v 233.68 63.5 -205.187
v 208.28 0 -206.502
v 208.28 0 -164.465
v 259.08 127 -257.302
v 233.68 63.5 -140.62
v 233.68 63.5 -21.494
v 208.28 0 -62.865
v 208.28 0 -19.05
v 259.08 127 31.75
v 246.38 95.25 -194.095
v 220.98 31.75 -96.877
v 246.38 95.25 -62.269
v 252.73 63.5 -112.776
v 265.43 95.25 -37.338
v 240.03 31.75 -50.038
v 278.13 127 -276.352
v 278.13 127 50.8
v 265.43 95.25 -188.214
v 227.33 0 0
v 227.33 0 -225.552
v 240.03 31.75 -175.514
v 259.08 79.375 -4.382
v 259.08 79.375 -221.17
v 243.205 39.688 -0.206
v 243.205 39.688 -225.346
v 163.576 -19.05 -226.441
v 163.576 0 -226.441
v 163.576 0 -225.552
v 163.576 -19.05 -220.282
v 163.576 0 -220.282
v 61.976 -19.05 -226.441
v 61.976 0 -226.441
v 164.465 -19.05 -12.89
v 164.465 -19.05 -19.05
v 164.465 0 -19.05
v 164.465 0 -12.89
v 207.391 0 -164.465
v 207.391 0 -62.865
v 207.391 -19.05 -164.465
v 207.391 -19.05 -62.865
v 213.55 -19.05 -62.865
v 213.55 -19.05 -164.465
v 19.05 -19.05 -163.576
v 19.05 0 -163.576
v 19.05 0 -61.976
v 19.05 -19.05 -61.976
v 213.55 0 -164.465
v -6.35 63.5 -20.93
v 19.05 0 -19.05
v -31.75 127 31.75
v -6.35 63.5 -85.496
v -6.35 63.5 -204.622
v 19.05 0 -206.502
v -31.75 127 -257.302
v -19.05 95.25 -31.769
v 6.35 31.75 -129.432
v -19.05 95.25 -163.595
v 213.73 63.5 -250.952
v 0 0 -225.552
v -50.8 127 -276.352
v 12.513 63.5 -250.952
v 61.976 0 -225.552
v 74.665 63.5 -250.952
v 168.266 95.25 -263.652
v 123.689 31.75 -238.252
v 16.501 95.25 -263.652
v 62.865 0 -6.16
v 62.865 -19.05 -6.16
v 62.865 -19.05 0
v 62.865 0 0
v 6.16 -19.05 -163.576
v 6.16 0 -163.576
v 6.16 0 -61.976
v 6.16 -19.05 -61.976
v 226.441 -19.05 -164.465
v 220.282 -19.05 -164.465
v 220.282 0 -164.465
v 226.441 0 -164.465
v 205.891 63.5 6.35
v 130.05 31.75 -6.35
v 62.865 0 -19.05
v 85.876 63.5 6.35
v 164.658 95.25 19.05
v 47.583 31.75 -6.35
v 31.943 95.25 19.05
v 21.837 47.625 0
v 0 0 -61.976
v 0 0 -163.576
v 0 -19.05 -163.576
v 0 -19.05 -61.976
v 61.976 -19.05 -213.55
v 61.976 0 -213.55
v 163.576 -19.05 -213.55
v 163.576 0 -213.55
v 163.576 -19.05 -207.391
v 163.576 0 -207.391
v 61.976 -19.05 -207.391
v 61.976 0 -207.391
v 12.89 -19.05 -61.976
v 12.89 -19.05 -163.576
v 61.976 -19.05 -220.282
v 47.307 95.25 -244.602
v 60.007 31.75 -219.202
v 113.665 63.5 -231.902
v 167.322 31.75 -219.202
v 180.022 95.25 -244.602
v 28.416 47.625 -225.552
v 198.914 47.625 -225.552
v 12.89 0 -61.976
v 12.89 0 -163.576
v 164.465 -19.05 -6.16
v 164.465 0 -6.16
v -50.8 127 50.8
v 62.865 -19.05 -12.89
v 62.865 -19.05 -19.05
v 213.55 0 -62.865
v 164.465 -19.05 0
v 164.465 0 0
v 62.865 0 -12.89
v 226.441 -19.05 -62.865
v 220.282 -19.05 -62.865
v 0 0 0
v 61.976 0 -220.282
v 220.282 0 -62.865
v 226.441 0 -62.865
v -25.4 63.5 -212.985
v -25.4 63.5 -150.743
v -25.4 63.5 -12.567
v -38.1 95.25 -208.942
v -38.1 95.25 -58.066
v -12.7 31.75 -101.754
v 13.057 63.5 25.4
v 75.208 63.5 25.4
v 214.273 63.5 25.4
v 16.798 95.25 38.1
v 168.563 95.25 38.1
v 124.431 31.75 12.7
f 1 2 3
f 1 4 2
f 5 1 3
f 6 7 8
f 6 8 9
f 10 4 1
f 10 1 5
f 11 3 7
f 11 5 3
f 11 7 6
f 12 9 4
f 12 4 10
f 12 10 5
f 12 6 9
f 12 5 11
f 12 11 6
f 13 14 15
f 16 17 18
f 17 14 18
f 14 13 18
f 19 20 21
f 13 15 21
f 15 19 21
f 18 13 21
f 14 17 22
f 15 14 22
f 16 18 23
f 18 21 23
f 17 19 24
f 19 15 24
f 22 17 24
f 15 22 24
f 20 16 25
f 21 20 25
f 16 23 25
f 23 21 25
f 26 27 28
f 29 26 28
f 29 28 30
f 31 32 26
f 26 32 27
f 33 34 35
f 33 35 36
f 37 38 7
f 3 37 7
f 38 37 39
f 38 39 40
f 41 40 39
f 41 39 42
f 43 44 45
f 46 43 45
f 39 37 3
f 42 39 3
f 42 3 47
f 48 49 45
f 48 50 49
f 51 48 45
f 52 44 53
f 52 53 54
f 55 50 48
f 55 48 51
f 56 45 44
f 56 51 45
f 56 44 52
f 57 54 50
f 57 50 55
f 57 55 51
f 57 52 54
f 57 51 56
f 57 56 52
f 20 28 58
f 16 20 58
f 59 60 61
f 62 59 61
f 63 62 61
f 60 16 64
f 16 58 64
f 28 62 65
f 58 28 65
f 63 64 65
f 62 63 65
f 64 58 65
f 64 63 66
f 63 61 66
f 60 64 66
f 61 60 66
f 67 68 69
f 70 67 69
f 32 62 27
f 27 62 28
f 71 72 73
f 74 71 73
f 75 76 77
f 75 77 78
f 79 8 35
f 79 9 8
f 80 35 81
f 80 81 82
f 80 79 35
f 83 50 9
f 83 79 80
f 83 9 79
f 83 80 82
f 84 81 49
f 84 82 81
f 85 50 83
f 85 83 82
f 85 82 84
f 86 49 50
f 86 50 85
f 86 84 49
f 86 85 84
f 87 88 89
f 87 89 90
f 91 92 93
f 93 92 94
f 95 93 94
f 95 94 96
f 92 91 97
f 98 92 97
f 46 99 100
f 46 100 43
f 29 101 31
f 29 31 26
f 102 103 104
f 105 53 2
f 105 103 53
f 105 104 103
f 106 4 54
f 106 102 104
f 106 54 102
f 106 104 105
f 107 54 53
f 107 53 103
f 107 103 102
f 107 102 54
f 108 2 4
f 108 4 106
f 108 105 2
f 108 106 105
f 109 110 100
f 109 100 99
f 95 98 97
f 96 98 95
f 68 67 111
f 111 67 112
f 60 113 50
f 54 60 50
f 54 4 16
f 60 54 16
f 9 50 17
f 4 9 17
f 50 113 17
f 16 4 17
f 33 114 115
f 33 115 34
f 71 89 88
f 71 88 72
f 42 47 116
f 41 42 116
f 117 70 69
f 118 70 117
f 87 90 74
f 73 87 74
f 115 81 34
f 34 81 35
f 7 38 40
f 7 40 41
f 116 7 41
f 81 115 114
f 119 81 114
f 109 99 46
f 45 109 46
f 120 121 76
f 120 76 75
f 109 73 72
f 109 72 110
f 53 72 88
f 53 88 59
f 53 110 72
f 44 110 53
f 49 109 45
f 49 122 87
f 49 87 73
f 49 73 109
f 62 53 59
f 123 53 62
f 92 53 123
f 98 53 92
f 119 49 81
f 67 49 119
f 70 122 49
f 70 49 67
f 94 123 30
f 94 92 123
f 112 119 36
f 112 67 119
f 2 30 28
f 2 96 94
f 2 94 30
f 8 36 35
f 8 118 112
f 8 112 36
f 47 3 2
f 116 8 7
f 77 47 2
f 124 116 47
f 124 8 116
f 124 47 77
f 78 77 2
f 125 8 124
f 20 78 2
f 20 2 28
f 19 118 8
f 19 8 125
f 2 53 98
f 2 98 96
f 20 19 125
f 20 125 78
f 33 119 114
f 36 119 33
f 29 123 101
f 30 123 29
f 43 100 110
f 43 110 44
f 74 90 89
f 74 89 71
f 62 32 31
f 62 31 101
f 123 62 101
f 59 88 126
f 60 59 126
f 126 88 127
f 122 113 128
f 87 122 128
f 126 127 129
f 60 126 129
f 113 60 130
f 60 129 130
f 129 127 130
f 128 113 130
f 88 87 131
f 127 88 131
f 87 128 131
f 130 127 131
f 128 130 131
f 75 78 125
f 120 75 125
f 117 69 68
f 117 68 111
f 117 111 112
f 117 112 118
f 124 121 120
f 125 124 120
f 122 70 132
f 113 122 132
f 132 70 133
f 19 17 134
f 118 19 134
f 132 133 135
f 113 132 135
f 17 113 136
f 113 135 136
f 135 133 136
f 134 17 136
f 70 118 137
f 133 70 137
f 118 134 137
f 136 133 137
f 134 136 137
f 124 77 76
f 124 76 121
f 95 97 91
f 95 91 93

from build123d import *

# Parameters (mm, degrees)
SKETCH5_W           = 6.1595
SKETCH5_H           = 101.6
SKETCH5_W_2         = 101.6
SKETCH5_H_2         = 6.1595
BOSS_EXTRUDE1_DEPTH = 19.05


with BuildPart() as part:
    # Sketch2 → Loft1 section 0
    with BuildSketch(Plane(origin=(0, 127, 0), x_dir=(1, 0, 0), z_dir=(0, 1, 0))):
        with BuildLine():
            Line((-50.8, -50.8), (278.13, -50.8))
            Line((278.13, -50.8), (278.13, 276.352))
            Line((278.13, 276.352), (-50.8, 276.352))
            Line((-50.8, 276.352), (-50.8, -50.8))
        make_face()
    # Sketch1 → Loft1 section 1
    with BuildSketch(Plane(origin=(0, 0, 0), x_dir=(1, 0, 0), z_dir=(0, 1, 0))):
        with BuildLine():
            Line((0, 0), (227.33, 0))
            Line((227.33, 0), (227.33, 225.552))
            Line((227.33, 225.552), (0, 225.552))
            Line((0, 225.552), (0, 0))
        make_face()
    loft()

    # Sketch4 → Cut-Loft3 section 0
    with BuildSketch(Plane.XZ):
        with BuildLine():
            Line((208.28, -19.05), (19.05, -19.05))
            Line((19.05, -19.05), (19.05, -206.502))
            Line((19.05, -206.502), (208.28, -206.502))
            Line((208.28, -206.502), (208.28, -19.05))
        make_face()
    # Sketch3 → Cut-Loft3 section 1
    with BuildSketch(Plane(origin=(0, 127, 0), x_dir=(1, 0, 0), z_dir=(0, 1, 0))):
        with BuildLine():
            Line((-31.75, 257.302), (-31.75, -31.75))
            Line((-31.75, -31.75), (259.08, -31.75))
            Line((259.08, -31.75), (259.08, 257.302))
            Line((259.08, 257.302), (-31.75, 257.302))
        make_face()
    loft(mode=Mode.SUBTRACT)

    # Sketch5 → Boss-Extrude1 (add)
    with BuildSketch(Plane.XZ):
        with Locations((3.07975, -112.776)):
            Rectangle(SKETCH5_W, SKETCH5_H)
        with Locations((15.97025, -112.776)):
            Rectangle(SKETCH5_W, SKETCH5_H)
        with Locations((113.665, -3.07975)):
            Rectangle(SKETCH5_W_2, SKETCH5_H_2)
        with Locations((113.665, -15.97025)):
            Rectangle(SKETCH5_W_2, SKETCH5_H_2)
        with Locations((223.36125, -113.665)):
            Rectangle(SKETCH5_W, SKETCH5_H)
        with Locations((210.47075, -113.665)):
            Rectangle(SKETCH5_W, SKETCH5_H)
        with Locations((112.776, -223.36125)):
            Rectangle(SKETCH5_W_2, SKETCH5_H_2)
        with Locations((112.776, -210.47075)):
            Rectangle(SKETCH5_W_2, SKETCH5_H_2)
    extrude(amount=BOSS_EXTRUDE1_DEPTH)


solid = part.part
